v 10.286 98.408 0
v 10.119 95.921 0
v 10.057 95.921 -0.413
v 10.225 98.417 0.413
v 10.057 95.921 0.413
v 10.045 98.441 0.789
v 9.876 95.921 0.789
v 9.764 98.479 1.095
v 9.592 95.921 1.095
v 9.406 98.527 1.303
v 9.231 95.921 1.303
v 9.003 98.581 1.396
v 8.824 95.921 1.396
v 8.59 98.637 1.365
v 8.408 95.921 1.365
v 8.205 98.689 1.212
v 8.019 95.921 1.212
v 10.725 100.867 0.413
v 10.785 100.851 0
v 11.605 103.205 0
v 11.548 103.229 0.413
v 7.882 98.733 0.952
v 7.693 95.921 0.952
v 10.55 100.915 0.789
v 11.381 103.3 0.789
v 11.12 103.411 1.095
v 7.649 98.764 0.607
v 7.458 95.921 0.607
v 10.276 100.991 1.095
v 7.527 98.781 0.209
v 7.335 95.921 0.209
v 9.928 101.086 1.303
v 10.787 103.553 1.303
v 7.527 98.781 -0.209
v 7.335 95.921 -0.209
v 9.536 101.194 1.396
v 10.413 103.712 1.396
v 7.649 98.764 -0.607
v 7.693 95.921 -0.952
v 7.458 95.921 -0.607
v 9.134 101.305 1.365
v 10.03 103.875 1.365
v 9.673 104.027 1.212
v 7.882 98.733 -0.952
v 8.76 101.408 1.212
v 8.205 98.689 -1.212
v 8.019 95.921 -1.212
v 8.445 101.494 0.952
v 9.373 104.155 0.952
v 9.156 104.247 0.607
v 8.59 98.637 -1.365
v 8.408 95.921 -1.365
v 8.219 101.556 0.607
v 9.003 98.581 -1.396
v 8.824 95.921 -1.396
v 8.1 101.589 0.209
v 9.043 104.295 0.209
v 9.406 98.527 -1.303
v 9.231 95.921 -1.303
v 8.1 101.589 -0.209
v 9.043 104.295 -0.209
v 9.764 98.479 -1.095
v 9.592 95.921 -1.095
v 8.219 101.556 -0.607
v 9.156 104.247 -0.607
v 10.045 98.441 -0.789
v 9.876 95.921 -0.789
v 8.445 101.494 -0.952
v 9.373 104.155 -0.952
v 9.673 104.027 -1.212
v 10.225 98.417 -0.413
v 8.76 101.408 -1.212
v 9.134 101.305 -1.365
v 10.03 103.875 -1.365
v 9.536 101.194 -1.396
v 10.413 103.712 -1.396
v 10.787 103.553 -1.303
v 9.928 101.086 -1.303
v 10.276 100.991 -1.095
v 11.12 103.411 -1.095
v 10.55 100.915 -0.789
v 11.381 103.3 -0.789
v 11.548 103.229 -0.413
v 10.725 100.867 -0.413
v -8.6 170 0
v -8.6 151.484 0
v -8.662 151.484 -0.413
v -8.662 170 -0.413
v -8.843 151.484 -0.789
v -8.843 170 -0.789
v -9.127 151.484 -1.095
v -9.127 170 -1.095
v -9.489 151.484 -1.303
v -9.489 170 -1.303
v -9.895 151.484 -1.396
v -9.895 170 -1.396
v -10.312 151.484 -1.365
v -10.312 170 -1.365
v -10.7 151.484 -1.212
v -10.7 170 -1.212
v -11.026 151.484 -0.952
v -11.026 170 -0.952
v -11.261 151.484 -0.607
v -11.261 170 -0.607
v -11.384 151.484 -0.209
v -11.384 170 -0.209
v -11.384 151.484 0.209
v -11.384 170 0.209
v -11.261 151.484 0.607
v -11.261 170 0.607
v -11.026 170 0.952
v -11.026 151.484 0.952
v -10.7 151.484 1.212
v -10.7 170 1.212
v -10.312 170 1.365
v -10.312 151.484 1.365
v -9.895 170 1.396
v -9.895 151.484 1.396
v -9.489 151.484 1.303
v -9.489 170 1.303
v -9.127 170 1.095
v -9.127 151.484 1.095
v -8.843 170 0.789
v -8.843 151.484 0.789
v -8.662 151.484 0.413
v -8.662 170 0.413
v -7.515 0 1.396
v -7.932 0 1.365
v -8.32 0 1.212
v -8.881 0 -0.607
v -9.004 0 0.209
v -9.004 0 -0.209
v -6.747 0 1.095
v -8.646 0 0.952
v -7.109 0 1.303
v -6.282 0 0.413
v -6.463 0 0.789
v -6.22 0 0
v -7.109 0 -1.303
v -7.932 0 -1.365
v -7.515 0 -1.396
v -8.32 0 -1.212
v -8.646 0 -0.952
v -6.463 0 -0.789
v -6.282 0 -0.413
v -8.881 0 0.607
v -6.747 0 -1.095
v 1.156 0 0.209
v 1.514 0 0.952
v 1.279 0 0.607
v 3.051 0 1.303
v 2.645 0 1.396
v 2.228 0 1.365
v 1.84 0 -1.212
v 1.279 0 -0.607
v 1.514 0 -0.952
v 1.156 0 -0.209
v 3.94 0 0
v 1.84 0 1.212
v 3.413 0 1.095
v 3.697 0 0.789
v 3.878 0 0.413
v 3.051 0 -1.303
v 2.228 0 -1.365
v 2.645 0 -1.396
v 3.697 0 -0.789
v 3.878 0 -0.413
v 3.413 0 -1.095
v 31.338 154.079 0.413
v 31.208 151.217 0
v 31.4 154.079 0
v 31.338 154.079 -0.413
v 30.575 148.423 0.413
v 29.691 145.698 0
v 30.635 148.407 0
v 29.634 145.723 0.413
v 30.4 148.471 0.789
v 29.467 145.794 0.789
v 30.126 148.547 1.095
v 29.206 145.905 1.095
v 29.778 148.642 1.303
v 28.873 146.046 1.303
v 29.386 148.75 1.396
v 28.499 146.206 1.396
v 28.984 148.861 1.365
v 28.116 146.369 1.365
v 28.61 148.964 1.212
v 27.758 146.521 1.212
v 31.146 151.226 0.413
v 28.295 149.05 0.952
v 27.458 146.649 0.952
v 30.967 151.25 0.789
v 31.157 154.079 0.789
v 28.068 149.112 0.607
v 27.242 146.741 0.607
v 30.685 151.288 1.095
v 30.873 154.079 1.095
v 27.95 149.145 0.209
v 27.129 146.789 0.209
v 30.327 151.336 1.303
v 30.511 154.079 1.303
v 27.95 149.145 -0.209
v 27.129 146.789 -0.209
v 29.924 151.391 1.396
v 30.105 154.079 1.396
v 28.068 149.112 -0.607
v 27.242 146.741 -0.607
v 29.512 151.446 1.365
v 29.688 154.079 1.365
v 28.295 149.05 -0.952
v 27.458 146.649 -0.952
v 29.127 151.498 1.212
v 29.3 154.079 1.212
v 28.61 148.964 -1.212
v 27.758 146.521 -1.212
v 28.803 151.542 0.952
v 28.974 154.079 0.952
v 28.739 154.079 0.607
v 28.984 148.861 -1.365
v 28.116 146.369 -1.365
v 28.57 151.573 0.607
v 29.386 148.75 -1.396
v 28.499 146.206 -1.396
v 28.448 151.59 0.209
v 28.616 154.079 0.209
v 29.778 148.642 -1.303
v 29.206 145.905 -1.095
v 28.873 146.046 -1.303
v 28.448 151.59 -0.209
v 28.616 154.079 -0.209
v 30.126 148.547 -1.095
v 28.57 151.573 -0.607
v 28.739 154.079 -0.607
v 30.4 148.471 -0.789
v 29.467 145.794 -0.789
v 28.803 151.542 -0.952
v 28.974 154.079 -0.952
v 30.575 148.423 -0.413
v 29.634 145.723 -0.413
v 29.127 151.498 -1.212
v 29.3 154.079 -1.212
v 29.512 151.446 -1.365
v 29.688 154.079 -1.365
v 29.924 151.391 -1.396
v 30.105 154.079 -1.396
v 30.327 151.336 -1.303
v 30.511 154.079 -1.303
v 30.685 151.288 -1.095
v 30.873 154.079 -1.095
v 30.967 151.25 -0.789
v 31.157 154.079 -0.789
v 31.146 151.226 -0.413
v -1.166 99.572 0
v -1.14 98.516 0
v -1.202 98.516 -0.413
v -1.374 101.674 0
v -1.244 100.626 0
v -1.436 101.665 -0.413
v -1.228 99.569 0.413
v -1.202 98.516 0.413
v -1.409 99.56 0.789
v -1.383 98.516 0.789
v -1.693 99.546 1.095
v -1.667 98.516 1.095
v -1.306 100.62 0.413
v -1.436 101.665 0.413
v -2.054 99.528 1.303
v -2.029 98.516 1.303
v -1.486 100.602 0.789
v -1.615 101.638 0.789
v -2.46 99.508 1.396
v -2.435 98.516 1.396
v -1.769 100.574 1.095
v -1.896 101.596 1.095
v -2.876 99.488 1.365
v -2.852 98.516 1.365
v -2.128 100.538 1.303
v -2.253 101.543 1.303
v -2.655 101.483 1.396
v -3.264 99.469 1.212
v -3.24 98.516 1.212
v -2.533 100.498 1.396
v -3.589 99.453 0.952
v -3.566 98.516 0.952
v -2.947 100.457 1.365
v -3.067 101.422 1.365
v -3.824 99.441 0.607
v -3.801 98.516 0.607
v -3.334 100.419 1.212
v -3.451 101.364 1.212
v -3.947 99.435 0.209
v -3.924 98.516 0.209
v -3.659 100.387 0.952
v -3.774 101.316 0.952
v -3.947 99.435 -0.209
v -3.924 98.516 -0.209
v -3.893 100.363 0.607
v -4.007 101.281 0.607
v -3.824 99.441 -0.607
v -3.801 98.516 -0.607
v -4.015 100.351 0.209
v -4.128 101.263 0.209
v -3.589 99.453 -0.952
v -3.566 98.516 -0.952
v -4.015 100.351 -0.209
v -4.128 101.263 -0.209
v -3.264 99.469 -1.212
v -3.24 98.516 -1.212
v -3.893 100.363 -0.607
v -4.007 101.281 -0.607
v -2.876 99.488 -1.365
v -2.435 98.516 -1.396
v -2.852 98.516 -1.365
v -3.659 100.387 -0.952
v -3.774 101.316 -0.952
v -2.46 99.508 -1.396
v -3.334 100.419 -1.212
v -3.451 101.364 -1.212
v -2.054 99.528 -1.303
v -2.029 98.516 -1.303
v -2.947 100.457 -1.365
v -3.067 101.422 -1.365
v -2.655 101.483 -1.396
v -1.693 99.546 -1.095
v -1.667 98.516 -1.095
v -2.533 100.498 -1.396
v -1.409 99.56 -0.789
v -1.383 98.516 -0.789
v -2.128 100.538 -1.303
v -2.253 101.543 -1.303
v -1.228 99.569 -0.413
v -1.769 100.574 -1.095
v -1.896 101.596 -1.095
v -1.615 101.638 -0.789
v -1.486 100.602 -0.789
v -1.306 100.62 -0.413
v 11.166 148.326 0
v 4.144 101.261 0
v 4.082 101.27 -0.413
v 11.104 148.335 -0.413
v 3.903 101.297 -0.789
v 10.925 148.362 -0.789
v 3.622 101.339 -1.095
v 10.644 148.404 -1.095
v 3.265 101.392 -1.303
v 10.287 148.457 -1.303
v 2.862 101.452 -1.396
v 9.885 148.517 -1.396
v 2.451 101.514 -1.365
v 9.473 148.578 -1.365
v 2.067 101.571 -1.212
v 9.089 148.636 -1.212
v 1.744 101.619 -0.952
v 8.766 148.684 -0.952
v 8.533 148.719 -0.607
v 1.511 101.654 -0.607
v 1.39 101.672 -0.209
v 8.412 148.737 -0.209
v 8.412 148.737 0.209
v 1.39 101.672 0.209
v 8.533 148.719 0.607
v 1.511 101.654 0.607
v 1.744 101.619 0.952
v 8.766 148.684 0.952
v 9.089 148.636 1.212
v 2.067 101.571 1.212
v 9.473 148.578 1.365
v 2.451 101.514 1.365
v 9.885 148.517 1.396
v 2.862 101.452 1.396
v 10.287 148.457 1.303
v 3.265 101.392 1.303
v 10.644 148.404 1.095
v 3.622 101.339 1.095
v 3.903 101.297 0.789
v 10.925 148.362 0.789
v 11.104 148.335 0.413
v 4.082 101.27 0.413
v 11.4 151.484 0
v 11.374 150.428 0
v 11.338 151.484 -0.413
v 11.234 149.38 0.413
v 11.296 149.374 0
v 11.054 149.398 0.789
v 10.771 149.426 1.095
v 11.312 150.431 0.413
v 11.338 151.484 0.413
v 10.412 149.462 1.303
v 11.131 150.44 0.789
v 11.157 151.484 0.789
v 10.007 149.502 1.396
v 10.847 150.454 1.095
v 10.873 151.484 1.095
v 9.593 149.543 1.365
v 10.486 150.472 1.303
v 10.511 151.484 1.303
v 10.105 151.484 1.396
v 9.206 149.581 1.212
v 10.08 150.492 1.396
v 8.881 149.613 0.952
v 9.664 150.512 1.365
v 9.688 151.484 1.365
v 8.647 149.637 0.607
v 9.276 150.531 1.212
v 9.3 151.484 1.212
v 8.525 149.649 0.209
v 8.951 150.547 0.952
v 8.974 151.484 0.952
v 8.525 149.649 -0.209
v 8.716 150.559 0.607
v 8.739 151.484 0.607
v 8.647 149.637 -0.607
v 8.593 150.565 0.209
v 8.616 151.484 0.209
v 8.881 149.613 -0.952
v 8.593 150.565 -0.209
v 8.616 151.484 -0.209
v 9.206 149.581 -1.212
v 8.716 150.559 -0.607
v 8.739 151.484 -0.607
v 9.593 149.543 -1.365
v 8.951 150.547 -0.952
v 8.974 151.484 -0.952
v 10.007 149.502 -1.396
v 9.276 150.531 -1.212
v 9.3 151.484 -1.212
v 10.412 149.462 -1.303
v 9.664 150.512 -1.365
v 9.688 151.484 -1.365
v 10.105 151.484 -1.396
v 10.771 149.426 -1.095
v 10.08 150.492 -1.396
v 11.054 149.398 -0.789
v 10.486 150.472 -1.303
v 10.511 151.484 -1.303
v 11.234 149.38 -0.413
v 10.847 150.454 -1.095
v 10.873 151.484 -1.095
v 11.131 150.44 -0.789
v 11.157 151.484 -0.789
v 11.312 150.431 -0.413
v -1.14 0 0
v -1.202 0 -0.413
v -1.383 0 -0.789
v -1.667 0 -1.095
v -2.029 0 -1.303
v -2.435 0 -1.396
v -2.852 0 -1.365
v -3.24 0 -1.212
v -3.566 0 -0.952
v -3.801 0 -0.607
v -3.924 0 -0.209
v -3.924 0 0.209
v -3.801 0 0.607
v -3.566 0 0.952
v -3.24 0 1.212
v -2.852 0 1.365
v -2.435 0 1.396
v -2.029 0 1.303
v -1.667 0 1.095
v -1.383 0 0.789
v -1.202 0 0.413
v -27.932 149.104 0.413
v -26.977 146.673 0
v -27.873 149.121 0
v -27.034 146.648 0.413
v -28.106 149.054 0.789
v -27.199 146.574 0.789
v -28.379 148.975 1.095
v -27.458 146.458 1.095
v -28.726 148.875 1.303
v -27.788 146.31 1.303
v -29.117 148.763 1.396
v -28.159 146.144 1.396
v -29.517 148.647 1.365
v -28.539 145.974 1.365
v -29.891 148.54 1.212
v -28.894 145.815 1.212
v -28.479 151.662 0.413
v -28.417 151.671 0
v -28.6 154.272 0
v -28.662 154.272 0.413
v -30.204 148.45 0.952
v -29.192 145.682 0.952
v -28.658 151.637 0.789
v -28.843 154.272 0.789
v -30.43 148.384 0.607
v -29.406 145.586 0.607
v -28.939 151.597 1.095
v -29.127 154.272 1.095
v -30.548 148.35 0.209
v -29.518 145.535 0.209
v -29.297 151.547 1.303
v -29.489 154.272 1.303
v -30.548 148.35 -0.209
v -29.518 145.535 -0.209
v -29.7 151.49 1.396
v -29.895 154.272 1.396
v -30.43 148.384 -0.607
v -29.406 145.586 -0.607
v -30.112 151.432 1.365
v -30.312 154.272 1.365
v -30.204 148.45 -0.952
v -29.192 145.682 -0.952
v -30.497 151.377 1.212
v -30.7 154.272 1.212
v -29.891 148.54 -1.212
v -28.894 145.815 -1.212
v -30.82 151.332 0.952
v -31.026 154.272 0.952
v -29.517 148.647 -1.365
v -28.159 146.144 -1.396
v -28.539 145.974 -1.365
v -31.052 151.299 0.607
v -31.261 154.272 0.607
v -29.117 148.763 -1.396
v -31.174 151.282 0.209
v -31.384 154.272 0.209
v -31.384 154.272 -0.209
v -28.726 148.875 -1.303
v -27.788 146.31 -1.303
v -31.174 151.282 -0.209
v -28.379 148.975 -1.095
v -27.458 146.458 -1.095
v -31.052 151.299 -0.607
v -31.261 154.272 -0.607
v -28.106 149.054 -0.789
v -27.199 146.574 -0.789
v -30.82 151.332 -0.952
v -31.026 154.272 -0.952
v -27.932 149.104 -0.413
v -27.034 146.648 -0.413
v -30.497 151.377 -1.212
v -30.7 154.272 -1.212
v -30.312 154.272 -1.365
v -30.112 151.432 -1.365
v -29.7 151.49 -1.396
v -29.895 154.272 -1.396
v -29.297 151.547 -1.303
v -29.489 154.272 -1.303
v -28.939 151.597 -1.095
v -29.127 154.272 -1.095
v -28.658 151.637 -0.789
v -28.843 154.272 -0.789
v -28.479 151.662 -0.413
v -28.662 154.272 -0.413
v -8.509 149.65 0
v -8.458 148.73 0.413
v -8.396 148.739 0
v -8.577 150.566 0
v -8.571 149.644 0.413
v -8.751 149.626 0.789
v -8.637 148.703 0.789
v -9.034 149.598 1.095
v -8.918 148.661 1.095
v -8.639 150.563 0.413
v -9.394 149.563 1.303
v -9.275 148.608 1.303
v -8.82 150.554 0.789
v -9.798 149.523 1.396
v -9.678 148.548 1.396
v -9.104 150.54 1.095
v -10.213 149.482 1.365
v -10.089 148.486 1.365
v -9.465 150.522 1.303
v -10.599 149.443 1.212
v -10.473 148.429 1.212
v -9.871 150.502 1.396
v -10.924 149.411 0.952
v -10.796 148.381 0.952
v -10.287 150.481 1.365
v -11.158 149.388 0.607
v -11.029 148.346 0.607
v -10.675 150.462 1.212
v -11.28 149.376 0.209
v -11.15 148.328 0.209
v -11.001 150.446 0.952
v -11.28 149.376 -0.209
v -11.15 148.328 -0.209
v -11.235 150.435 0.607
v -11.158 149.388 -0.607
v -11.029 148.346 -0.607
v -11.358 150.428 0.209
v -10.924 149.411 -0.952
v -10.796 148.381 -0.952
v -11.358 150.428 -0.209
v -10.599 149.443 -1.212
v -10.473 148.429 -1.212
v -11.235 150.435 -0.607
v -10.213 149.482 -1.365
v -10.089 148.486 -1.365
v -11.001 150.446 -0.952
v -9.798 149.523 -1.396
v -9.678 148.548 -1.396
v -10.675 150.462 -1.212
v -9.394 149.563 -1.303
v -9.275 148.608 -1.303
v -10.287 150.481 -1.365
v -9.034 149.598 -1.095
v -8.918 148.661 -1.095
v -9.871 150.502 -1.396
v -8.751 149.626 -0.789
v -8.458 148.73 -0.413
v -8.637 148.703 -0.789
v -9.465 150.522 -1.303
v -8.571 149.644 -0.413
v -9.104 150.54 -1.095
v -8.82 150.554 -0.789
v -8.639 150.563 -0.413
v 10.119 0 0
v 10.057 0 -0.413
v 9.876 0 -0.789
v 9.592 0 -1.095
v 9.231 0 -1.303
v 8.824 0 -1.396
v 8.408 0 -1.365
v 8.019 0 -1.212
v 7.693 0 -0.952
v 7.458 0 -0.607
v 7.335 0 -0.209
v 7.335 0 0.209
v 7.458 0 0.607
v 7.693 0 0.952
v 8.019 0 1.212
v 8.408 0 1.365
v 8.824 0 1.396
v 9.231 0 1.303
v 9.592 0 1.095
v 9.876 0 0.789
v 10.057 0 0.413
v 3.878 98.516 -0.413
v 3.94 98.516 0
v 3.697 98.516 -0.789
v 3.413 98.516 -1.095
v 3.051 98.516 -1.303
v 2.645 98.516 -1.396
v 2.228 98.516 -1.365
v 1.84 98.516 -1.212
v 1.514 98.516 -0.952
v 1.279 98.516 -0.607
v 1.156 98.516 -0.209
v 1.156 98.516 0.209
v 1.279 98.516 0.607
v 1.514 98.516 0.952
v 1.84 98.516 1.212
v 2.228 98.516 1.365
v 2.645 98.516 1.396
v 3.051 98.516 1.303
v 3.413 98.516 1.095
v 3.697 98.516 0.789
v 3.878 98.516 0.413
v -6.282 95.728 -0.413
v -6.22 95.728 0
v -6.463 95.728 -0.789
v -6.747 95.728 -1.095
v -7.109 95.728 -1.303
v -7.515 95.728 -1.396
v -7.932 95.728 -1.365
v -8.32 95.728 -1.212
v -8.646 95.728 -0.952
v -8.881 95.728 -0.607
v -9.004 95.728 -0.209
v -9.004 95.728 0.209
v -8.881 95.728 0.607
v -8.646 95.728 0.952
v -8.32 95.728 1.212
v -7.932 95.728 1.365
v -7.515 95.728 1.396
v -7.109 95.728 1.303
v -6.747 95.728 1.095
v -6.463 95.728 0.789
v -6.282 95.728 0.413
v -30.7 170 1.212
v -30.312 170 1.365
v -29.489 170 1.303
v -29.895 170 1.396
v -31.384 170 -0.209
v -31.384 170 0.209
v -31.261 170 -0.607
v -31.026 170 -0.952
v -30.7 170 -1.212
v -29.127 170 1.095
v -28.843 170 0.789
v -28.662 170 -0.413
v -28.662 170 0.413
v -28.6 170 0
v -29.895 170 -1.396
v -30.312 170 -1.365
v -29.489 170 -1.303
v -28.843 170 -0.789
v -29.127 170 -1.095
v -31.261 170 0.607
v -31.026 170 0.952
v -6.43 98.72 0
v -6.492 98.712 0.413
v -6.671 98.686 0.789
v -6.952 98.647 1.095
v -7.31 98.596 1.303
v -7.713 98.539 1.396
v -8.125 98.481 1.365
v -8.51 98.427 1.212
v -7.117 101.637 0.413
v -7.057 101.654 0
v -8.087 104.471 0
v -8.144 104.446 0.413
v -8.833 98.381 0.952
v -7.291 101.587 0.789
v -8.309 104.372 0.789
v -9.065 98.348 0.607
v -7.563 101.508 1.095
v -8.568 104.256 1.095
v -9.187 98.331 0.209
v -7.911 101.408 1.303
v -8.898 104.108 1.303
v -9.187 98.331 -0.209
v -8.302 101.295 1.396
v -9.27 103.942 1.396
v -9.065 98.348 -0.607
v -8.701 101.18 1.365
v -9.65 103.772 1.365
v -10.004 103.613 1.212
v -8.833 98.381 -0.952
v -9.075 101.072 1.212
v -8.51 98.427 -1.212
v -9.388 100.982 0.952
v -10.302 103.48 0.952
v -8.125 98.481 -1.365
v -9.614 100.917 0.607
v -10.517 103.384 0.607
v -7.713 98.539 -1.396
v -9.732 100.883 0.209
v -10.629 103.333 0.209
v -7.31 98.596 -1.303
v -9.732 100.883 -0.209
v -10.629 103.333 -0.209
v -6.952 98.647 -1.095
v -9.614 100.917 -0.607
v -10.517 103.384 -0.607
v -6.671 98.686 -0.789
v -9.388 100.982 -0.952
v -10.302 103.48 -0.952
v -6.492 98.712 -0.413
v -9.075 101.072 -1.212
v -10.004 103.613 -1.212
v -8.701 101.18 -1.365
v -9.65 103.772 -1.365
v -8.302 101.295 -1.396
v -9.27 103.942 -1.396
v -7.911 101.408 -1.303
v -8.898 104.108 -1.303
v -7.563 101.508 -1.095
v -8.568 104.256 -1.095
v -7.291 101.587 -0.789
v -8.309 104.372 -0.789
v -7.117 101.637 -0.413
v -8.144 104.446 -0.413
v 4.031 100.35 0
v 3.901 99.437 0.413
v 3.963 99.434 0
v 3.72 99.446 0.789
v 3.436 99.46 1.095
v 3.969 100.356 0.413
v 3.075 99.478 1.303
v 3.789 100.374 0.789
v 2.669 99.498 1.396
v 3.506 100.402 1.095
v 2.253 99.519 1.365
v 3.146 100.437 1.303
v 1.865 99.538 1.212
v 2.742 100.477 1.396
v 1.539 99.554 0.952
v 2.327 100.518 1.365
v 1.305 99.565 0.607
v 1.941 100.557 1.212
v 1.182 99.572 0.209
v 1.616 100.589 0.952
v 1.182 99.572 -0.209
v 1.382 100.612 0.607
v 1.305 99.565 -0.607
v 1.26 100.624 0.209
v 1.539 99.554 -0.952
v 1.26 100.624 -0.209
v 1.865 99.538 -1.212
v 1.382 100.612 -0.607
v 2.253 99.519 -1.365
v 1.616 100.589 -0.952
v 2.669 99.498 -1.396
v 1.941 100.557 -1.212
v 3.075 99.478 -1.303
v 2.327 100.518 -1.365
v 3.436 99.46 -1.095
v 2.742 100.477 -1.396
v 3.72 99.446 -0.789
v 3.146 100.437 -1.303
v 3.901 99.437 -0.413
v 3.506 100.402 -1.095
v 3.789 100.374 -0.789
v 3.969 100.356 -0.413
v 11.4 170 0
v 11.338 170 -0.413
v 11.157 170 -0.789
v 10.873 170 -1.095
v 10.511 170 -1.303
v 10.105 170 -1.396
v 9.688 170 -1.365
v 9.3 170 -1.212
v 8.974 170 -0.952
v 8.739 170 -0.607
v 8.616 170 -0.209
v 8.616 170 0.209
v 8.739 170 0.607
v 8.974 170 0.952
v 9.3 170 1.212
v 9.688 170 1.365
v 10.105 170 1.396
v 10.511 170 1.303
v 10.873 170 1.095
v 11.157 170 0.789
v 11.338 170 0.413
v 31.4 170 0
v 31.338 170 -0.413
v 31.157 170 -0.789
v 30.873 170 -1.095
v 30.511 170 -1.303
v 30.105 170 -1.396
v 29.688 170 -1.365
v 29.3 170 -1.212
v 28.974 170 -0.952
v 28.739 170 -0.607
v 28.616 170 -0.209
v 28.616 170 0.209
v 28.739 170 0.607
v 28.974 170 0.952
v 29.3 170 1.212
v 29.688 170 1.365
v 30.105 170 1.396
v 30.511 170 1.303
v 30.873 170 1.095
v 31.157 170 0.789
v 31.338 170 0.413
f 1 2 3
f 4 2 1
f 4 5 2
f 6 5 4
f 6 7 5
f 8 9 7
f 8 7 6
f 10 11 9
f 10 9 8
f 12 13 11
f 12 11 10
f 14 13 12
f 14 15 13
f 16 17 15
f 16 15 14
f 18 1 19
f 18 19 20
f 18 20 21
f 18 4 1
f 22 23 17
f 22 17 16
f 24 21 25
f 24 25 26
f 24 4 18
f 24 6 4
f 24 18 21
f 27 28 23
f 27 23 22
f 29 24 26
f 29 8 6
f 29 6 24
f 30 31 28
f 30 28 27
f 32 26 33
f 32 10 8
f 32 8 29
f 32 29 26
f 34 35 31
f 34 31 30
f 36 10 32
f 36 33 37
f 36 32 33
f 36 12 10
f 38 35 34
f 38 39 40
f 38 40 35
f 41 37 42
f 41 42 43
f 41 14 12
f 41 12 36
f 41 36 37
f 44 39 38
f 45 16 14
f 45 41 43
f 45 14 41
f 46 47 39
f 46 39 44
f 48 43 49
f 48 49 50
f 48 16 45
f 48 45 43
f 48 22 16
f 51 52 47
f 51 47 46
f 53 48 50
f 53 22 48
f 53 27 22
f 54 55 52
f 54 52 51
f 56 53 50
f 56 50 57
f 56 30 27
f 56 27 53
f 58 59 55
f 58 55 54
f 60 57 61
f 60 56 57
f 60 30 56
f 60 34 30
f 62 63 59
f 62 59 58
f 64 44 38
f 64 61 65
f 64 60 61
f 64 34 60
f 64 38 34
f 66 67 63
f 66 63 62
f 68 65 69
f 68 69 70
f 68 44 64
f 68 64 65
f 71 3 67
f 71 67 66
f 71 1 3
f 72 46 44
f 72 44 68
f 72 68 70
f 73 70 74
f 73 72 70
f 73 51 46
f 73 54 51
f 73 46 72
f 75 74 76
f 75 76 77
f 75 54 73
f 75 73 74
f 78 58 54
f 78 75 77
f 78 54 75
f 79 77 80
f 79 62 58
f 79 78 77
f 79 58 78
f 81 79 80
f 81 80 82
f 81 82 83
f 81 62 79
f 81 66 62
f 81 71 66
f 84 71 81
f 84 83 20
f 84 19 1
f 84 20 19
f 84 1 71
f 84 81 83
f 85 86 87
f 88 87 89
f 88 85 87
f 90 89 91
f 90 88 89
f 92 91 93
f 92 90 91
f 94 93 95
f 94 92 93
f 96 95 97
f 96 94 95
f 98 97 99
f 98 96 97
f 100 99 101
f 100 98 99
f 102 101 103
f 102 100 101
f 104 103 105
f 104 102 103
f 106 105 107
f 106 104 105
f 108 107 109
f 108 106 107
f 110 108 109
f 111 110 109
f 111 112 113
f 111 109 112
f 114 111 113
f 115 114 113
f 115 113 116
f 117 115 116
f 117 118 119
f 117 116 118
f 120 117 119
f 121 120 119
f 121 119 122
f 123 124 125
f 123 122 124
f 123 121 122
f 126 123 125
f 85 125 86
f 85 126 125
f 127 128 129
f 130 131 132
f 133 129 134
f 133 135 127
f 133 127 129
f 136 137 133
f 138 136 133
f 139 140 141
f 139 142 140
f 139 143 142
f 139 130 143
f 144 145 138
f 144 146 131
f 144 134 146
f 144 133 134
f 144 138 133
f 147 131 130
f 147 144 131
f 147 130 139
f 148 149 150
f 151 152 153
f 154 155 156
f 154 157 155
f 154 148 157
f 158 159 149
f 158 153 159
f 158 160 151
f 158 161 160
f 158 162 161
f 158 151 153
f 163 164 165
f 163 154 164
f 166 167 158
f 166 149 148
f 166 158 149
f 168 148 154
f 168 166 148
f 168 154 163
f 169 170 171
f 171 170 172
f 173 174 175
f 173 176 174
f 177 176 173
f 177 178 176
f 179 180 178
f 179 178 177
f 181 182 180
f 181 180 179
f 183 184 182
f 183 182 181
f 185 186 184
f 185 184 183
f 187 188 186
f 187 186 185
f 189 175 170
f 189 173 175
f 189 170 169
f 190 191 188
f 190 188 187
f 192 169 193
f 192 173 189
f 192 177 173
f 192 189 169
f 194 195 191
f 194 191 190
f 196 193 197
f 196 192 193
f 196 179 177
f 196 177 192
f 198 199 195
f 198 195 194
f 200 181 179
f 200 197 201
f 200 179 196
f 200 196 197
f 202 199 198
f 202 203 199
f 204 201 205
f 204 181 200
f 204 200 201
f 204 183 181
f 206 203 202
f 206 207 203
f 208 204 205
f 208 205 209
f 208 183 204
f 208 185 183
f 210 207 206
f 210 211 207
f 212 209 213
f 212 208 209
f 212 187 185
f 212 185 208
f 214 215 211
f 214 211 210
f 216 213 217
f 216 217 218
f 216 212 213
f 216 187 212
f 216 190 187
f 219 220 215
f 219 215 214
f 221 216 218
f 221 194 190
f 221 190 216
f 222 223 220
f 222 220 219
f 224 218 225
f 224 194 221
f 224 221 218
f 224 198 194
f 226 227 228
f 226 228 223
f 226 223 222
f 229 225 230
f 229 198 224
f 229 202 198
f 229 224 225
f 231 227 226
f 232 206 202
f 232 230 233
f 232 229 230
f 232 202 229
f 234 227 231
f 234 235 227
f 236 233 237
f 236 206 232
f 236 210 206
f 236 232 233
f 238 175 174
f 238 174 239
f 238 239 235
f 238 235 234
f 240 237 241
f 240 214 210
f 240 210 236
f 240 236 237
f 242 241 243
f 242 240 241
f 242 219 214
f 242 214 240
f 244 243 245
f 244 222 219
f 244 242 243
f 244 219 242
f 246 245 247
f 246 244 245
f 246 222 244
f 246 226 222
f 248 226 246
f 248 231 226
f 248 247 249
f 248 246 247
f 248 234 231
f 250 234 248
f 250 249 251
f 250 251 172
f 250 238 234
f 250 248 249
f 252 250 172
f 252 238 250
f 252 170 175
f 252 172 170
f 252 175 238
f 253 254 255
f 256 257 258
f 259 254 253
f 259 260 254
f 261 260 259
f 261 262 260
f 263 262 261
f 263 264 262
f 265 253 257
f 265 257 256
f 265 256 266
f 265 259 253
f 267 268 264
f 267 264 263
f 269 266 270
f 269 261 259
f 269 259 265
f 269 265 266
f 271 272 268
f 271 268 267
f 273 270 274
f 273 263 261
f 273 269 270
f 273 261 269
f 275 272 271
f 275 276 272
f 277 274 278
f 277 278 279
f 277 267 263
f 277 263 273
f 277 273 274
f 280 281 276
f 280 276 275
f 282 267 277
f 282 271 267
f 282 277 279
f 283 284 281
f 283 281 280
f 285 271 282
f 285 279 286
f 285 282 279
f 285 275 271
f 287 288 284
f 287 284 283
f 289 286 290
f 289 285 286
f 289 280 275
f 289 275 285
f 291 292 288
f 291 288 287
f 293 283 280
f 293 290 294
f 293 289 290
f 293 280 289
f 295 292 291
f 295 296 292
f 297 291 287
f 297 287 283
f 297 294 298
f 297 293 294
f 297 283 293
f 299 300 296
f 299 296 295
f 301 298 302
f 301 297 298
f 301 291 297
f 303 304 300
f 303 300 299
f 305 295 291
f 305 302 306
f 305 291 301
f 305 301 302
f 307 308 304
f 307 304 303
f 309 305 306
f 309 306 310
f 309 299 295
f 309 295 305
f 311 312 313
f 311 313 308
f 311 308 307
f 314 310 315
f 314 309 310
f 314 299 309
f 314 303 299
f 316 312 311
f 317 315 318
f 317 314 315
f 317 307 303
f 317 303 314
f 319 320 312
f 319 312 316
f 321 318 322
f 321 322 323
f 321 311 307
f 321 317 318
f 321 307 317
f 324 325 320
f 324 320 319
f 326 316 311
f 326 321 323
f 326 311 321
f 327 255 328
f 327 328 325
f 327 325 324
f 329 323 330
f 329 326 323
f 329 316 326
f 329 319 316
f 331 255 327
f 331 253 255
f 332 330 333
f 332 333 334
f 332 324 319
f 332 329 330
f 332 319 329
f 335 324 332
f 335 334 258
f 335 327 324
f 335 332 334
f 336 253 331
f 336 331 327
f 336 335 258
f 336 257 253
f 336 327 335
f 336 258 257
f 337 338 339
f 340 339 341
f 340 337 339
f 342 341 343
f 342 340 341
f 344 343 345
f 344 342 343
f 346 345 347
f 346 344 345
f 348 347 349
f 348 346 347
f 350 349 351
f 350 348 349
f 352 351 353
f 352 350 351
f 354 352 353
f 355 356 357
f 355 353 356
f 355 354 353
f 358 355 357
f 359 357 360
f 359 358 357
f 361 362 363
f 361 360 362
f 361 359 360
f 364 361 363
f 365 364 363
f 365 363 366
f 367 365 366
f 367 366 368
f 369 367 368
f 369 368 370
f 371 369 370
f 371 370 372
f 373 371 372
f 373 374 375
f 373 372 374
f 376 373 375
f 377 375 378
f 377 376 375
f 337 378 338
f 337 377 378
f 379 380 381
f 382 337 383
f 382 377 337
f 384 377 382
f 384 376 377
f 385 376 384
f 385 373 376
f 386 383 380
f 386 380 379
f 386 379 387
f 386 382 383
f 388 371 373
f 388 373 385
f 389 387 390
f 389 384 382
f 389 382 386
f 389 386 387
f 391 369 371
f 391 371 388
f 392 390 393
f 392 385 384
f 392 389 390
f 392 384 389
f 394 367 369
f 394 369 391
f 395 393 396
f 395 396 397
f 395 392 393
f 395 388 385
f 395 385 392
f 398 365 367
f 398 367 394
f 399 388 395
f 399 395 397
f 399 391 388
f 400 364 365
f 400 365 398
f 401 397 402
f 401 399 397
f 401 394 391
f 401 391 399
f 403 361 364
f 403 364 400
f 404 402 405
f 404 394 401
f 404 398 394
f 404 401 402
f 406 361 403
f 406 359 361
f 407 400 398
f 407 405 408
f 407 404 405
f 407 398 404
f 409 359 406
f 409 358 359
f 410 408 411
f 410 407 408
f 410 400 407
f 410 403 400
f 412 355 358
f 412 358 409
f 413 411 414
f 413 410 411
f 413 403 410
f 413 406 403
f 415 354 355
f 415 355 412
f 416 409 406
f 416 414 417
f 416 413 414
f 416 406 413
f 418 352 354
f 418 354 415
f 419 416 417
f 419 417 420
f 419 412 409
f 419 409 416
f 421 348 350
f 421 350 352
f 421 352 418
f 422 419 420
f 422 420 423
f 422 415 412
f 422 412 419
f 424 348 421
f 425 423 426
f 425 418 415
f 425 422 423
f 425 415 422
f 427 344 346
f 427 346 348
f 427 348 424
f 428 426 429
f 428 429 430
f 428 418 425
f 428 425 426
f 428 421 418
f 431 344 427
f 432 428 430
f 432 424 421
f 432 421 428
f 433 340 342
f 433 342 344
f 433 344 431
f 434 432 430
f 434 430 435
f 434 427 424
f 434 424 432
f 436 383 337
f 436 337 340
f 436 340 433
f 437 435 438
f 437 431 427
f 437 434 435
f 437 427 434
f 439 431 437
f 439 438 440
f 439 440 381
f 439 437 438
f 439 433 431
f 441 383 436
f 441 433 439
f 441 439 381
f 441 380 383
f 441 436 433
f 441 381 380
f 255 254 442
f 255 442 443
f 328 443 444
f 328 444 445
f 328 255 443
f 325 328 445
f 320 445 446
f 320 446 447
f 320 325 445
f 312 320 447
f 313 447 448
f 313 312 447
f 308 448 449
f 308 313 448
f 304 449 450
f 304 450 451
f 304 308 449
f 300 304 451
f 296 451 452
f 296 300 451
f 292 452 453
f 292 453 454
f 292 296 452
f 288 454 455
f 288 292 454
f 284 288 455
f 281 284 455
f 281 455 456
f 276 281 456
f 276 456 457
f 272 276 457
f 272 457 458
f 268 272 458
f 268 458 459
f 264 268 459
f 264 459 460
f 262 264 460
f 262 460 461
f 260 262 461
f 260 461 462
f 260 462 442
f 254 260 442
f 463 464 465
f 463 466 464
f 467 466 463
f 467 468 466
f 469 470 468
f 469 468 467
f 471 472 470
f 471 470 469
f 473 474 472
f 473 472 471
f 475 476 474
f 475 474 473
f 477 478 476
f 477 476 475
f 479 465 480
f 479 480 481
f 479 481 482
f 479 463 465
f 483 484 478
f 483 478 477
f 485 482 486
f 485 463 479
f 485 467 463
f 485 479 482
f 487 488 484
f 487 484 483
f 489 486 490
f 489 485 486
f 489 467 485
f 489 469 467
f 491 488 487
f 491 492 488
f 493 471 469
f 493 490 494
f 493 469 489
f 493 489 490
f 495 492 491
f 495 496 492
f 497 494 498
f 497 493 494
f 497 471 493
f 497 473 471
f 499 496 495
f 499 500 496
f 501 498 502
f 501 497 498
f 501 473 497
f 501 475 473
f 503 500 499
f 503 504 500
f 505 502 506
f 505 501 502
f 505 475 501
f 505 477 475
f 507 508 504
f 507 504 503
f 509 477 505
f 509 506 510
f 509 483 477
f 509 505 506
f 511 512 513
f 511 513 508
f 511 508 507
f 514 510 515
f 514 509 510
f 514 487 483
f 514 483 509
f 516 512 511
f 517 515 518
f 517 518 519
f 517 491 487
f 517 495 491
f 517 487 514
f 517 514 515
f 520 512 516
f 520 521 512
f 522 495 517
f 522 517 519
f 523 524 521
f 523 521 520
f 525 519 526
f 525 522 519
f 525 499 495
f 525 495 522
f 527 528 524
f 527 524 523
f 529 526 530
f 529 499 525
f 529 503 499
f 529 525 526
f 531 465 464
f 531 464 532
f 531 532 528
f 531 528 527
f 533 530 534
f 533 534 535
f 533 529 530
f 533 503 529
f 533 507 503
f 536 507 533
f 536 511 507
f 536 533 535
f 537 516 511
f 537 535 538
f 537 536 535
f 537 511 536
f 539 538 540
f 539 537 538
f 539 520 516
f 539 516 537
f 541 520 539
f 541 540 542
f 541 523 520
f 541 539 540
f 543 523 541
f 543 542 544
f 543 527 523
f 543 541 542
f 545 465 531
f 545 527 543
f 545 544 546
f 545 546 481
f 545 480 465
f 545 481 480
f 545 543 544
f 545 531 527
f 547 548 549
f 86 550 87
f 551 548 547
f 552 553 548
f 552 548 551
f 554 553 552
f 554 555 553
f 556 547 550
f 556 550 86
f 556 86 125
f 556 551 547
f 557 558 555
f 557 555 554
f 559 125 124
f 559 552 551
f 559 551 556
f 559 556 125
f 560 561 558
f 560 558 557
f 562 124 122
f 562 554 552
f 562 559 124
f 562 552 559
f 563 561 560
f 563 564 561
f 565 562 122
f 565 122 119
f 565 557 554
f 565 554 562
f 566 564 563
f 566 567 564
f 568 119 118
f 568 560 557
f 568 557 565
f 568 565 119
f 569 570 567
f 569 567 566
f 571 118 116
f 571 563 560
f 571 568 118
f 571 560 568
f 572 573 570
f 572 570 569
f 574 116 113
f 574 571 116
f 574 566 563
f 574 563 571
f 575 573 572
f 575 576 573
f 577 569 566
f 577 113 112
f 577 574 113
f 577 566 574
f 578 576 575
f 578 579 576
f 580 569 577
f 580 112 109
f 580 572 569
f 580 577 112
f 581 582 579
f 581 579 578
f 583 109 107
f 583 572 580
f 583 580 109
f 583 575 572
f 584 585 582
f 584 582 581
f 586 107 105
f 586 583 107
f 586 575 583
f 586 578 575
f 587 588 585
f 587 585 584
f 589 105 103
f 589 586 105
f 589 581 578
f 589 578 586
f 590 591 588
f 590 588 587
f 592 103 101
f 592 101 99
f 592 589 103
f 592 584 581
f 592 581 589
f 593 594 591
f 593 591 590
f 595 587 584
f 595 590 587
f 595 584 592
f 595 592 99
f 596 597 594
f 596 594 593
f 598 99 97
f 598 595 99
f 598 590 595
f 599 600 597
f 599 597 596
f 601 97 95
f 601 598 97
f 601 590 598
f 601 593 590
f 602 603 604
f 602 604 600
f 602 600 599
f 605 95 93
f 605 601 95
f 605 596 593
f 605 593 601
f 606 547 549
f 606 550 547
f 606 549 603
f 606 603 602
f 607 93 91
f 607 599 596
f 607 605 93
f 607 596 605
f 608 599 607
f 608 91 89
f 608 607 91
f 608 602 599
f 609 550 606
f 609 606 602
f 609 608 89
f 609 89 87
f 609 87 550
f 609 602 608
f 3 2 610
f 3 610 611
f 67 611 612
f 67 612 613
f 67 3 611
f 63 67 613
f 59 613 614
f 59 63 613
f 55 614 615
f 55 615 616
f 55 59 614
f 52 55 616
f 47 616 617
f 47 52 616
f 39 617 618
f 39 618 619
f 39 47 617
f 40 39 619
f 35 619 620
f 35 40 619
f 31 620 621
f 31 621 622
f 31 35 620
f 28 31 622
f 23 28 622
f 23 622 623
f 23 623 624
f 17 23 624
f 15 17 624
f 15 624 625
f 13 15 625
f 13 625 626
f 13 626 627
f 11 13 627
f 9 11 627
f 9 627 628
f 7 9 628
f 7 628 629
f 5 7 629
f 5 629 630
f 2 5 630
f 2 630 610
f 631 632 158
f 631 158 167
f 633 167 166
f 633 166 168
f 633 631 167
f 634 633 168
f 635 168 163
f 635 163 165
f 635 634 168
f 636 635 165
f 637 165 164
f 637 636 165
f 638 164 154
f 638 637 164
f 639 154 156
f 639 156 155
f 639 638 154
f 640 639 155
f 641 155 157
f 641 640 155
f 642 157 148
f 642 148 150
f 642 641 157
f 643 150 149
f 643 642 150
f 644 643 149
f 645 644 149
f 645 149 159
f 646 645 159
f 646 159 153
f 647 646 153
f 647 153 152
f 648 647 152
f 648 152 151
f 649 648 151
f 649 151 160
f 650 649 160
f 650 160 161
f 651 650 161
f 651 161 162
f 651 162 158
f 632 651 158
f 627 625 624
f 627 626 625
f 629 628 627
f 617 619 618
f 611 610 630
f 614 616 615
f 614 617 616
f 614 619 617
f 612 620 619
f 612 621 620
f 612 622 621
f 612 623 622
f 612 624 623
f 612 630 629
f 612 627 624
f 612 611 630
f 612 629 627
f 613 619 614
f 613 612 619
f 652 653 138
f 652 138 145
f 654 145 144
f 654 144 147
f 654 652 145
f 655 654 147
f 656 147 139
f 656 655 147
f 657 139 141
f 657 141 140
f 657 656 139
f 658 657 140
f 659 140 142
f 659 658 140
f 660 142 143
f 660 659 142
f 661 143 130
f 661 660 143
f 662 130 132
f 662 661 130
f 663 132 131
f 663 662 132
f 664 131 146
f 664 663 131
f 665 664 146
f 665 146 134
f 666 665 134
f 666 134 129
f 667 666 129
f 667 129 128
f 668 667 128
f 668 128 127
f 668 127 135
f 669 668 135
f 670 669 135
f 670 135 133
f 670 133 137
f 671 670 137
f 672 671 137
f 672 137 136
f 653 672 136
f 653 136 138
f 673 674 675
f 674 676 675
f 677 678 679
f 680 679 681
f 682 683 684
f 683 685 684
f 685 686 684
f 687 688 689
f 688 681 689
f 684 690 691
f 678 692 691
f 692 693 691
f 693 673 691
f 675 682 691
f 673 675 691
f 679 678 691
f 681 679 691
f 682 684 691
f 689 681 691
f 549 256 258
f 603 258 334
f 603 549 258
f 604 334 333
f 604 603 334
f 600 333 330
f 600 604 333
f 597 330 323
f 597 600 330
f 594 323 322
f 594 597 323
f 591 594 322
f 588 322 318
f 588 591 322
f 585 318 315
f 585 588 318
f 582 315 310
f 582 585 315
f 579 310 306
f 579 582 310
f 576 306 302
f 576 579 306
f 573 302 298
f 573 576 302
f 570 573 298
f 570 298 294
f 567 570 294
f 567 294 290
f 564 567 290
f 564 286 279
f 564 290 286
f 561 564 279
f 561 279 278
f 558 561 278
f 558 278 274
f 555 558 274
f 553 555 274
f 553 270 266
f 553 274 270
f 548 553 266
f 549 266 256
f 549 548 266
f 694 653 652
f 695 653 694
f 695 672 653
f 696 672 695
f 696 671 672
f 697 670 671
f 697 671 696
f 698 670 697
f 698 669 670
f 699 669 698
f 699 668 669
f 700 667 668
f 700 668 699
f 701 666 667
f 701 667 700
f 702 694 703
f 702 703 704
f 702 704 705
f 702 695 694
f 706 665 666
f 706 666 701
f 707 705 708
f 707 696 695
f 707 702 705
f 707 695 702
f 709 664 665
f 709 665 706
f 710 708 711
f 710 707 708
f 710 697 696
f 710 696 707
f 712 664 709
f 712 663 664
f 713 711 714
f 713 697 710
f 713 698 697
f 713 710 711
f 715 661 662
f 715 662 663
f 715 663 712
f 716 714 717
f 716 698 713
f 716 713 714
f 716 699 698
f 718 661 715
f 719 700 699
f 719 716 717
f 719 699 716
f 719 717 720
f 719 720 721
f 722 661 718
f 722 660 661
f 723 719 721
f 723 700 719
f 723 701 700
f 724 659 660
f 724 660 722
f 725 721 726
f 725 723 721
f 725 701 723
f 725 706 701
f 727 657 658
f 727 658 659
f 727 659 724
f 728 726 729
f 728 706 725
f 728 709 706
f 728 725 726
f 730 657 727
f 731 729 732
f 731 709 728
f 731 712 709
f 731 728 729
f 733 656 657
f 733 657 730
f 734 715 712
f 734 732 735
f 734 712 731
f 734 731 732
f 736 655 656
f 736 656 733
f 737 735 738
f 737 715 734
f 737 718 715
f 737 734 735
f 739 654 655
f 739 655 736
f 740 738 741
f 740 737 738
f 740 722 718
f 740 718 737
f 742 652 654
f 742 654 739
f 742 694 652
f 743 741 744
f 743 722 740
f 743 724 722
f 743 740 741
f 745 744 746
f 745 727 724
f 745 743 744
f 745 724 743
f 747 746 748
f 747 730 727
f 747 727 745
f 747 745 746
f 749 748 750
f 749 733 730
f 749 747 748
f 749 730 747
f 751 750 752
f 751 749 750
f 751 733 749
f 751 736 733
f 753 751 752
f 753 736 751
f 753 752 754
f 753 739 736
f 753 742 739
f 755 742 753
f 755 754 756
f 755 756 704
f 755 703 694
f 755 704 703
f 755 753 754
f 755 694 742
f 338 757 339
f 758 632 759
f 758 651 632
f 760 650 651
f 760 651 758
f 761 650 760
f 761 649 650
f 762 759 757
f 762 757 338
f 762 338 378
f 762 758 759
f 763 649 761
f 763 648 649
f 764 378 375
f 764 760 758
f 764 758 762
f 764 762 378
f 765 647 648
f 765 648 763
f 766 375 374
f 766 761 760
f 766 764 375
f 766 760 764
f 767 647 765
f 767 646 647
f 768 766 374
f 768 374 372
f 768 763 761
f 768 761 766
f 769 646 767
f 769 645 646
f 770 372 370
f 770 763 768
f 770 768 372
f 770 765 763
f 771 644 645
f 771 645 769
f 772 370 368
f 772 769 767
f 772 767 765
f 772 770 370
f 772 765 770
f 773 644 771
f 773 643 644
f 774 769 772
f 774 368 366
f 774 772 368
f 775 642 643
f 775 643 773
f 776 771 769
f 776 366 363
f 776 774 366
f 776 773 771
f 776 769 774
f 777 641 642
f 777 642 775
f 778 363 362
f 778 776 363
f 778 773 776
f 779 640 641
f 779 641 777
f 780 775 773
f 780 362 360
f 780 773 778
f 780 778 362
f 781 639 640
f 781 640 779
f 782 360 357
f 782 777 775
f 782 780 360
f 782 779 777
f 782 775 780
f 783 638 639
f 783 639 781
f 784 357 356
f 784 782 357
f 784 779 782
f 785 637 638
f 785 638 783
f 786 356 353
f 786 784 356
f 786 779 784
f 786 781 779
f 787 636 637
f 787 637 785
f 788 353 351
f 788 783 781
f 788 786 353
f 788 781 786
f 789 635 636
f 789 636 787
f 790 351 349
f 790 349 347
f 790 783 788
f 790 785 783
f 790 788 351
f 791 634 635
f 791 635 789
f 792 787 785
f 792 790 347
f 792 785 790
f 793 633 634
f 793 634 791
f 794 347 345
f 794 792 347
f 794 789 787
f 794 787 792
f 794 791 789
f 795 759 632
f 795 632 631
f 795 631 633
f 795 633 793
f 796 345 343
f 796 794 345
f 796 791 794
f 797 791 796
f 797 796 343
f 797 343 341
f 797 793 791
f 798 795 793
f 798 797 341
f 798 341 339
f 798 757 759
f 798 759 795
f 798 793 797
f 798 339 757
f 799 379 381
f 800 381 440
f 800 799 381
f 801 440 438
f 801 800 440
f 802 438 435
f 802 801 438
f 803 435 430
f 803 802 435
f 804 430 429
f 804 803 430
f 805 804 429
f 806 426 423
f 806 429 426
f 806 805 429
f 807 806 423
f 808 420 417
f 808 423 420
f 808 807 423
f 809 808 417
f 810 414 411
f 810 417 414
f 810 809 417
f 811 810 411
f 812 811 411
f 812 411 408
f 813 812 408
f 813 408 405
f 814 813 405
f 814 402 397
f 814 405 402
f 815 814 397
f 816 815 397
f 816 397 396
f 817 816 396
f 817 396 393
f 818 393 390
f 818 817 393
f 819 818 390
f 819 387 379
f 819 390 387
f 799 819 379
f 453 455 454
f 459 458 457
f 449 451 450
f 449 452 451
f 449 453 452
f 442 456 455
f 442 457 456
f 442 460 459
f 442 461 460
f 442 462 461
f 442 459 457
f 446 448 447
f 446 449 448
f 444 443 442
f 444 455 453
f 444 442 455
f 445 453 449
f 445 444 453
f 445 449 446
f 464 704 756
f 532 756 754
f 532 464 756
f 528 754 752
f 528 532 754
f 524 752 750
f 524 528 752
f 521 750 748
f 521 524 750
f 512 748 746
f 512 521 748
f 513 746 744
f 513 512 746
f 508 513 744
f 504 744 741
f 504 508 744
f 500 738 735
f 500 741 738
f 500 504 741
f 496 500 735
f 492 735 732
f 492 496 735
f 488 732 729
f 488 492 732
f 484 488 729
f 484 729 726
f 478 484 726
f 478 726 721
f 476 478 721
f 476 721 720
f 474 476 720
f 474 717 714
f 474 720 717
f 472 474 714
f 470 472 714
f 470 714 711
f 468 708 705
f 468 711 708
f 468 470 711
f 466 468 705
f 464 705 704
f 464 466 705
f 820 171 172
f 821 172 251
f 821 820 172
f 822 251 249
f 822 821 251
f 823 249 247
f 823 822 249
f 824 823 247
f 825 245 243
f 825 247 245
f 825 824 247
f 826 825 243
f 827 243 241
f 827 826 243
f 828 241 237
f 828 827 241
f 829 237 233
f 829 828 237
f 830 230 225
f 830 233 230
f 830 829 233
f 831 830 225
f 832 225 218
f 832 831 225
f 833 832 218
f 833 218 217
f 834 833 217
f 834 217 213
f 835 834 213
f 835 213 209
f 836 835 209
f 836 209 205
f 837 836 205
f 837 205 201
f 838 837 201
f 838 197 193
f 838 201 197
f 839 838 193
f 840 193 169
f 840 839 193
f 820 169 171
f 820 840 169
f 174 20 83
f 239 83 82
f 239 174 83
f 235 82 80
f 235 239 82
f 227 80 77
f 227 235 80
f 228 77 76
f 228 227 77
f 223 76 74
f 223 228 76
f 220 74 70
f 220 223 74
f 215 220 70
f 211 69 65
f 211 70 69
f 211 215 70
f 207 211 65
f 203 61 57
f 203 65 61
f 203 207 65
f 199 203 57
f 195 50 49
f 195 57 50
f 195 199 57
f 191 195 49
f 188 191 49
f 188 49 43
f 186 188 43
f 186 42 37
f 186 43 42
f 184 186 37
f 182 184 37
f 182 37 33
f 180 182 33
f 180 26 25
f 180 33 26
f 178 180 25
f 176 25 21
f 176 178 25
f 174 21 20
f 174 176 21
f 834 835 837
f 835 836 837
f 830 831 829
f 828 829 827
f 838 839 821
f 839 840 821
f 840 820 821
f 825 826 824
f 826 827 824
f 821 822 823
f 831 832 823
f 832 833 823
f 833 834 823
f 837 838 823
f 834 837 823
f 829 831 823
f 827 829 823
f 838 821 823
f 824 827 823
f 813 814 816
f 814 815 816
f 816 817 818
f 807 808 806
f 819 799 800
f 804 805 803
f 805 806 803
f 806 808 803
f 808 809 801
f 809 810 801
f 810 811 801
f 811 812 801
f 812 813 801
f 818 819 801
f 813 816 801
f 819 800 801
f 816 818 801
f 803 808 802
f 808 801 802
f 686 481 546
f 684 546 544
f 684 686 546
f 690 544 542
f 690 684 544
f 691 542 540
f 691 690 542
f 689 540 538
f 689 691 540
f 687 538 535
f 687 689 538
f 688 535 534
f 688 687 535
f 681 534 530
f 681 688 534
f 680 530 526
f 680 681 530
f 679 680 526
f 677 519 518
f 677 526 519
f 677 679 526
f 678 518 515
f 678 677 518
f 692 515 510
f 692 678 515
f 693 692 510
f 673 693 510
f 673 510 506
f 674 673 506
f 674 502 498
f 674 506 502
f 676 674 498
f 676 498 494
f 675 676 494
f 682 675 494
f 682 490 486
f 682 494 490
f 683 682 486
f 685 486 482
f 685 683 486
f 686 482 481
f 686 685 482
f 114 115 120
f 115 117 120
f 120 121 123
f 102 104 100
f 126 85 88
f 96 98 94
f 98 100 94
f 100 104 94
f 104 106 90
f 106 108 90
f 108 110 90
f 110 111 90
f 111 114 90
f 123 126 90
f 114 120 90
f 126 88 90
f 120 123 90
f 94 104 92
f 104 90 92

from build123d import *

# Parameters (mm, degrees)
F4_R = 1.4
F5_R = 1.4
F6_R = 1.4
F7_R = 1.4


with BuildPart() as f8:
    # F8: sweep along a path in F0
    with BuildLine(Plane.XY) as f8_path:
        Line((-7.62, 0), (-7.62, 95.728198357))
        ThreePointArc((-7.62, 95.728198357), (-8.0611685251, 99.9057707785), (-9.3652111337, 103.8990418536))
        Line((-9.3652111337, 103.8990418536), (-28.2547888663, 146.1009581464))
        ThreePointArc((-28.2547888663, 146.1009581464), (-29.5588314749, 150.0942292215), (-30, 154.271801643))
        Line((-30, 154.271801643), (-30, 170))
    # F4 (on Front) → F8 (sweep)
    with BuildSketch(Plane.XZ):
        with Locations((-7.62, 0)):
            Circle(F4_R)
    sweep(path=f8_path.line)


with BuildPart() as f9:
    # F9: sweep along a path in F1
    with BuildLine(Plane.XY) as f9_path:
        Line((-2.54, 0), (-2.54, 98.5162120673))
        ThreePointArc((-2.54, 98.5162120673), (-2.5948144923, 99.9959333459), (-2.7589575062, 101.4675436074))
        Line((-2.7589575062, 101.4675436074), (-9.7810424938, 148.5324563926))
        ThreePointArc((-9.7810424938, 148.5324563926), (-9.9451855077, 150.0040666541), (-10, 151.4837879327))
        Line((-10, 151.4837879327), (-10, 170))
    # F5 (on Front) → F9 (sweep)
    with BuildSketch(Plane.XZ):
        with Locations((-2.54, 0)):
            Circle(F5_R)
    sweep(path=f9_path.line)


with BuildPart() as f10:
    # F10: sweep along a path in F2
    with BuildLine(Plane.XY) as f10_path:
        Line((2.54, 0), (2.54, 98.5162120673))
        ThreePointArc((2.54, 98.5162120673), (2.5948144923, 99.9959333459), (2.7589575062, 101.4675436074))
        Line((2.7589575062, 101.4675436074), (9.7810424938, 148.5324563926))
        ThreePointArc((9.7810424938, 148.5324563926), (9.9451855077, 150.0040666541), (10, 151.4837879327))
        Line((10, 151.4837879327), (10, 170))
    # F6 (on Front) → F10 (sweep)
    with BuildSketch(Plane.XZ):
        with Locations((2.54, 0)):
            Circle(F6_R)
    sweep(path=f10_path.line)


with BuildPart() as f11:
    # F11: sweep along a path in F3
    with BuildLine(Plane.XY) as f11_path:
        Line((8.7194243317, 0), (8.7194243317, 95.9209268862))
        ThreePointArc((8.7194243317, 95.9209268862), (9.1228519502, 99.9177194624), (10.3168594214, 103.7532703875))
        Line((10.3168594214, 103.7532703875), (28.4025649103, 146.2467296125))
        ThreePointArc((28.4025649103, 146.2467296125), (29.5965723815, 150.0822805376), (30, 154.0790731138))
        Line((30, 154.0790731138), (30, 170))
    # F7 (on Front) → F11 (sweep)
    with BuildSketch(Plane.XZ):
        with Locations((8.7194243317, 0)):
            Circle(F7_R)
    sweep(path=f11_path.line)


solid = Compound([f8.part, f9.part, f10.part, f11.part])
